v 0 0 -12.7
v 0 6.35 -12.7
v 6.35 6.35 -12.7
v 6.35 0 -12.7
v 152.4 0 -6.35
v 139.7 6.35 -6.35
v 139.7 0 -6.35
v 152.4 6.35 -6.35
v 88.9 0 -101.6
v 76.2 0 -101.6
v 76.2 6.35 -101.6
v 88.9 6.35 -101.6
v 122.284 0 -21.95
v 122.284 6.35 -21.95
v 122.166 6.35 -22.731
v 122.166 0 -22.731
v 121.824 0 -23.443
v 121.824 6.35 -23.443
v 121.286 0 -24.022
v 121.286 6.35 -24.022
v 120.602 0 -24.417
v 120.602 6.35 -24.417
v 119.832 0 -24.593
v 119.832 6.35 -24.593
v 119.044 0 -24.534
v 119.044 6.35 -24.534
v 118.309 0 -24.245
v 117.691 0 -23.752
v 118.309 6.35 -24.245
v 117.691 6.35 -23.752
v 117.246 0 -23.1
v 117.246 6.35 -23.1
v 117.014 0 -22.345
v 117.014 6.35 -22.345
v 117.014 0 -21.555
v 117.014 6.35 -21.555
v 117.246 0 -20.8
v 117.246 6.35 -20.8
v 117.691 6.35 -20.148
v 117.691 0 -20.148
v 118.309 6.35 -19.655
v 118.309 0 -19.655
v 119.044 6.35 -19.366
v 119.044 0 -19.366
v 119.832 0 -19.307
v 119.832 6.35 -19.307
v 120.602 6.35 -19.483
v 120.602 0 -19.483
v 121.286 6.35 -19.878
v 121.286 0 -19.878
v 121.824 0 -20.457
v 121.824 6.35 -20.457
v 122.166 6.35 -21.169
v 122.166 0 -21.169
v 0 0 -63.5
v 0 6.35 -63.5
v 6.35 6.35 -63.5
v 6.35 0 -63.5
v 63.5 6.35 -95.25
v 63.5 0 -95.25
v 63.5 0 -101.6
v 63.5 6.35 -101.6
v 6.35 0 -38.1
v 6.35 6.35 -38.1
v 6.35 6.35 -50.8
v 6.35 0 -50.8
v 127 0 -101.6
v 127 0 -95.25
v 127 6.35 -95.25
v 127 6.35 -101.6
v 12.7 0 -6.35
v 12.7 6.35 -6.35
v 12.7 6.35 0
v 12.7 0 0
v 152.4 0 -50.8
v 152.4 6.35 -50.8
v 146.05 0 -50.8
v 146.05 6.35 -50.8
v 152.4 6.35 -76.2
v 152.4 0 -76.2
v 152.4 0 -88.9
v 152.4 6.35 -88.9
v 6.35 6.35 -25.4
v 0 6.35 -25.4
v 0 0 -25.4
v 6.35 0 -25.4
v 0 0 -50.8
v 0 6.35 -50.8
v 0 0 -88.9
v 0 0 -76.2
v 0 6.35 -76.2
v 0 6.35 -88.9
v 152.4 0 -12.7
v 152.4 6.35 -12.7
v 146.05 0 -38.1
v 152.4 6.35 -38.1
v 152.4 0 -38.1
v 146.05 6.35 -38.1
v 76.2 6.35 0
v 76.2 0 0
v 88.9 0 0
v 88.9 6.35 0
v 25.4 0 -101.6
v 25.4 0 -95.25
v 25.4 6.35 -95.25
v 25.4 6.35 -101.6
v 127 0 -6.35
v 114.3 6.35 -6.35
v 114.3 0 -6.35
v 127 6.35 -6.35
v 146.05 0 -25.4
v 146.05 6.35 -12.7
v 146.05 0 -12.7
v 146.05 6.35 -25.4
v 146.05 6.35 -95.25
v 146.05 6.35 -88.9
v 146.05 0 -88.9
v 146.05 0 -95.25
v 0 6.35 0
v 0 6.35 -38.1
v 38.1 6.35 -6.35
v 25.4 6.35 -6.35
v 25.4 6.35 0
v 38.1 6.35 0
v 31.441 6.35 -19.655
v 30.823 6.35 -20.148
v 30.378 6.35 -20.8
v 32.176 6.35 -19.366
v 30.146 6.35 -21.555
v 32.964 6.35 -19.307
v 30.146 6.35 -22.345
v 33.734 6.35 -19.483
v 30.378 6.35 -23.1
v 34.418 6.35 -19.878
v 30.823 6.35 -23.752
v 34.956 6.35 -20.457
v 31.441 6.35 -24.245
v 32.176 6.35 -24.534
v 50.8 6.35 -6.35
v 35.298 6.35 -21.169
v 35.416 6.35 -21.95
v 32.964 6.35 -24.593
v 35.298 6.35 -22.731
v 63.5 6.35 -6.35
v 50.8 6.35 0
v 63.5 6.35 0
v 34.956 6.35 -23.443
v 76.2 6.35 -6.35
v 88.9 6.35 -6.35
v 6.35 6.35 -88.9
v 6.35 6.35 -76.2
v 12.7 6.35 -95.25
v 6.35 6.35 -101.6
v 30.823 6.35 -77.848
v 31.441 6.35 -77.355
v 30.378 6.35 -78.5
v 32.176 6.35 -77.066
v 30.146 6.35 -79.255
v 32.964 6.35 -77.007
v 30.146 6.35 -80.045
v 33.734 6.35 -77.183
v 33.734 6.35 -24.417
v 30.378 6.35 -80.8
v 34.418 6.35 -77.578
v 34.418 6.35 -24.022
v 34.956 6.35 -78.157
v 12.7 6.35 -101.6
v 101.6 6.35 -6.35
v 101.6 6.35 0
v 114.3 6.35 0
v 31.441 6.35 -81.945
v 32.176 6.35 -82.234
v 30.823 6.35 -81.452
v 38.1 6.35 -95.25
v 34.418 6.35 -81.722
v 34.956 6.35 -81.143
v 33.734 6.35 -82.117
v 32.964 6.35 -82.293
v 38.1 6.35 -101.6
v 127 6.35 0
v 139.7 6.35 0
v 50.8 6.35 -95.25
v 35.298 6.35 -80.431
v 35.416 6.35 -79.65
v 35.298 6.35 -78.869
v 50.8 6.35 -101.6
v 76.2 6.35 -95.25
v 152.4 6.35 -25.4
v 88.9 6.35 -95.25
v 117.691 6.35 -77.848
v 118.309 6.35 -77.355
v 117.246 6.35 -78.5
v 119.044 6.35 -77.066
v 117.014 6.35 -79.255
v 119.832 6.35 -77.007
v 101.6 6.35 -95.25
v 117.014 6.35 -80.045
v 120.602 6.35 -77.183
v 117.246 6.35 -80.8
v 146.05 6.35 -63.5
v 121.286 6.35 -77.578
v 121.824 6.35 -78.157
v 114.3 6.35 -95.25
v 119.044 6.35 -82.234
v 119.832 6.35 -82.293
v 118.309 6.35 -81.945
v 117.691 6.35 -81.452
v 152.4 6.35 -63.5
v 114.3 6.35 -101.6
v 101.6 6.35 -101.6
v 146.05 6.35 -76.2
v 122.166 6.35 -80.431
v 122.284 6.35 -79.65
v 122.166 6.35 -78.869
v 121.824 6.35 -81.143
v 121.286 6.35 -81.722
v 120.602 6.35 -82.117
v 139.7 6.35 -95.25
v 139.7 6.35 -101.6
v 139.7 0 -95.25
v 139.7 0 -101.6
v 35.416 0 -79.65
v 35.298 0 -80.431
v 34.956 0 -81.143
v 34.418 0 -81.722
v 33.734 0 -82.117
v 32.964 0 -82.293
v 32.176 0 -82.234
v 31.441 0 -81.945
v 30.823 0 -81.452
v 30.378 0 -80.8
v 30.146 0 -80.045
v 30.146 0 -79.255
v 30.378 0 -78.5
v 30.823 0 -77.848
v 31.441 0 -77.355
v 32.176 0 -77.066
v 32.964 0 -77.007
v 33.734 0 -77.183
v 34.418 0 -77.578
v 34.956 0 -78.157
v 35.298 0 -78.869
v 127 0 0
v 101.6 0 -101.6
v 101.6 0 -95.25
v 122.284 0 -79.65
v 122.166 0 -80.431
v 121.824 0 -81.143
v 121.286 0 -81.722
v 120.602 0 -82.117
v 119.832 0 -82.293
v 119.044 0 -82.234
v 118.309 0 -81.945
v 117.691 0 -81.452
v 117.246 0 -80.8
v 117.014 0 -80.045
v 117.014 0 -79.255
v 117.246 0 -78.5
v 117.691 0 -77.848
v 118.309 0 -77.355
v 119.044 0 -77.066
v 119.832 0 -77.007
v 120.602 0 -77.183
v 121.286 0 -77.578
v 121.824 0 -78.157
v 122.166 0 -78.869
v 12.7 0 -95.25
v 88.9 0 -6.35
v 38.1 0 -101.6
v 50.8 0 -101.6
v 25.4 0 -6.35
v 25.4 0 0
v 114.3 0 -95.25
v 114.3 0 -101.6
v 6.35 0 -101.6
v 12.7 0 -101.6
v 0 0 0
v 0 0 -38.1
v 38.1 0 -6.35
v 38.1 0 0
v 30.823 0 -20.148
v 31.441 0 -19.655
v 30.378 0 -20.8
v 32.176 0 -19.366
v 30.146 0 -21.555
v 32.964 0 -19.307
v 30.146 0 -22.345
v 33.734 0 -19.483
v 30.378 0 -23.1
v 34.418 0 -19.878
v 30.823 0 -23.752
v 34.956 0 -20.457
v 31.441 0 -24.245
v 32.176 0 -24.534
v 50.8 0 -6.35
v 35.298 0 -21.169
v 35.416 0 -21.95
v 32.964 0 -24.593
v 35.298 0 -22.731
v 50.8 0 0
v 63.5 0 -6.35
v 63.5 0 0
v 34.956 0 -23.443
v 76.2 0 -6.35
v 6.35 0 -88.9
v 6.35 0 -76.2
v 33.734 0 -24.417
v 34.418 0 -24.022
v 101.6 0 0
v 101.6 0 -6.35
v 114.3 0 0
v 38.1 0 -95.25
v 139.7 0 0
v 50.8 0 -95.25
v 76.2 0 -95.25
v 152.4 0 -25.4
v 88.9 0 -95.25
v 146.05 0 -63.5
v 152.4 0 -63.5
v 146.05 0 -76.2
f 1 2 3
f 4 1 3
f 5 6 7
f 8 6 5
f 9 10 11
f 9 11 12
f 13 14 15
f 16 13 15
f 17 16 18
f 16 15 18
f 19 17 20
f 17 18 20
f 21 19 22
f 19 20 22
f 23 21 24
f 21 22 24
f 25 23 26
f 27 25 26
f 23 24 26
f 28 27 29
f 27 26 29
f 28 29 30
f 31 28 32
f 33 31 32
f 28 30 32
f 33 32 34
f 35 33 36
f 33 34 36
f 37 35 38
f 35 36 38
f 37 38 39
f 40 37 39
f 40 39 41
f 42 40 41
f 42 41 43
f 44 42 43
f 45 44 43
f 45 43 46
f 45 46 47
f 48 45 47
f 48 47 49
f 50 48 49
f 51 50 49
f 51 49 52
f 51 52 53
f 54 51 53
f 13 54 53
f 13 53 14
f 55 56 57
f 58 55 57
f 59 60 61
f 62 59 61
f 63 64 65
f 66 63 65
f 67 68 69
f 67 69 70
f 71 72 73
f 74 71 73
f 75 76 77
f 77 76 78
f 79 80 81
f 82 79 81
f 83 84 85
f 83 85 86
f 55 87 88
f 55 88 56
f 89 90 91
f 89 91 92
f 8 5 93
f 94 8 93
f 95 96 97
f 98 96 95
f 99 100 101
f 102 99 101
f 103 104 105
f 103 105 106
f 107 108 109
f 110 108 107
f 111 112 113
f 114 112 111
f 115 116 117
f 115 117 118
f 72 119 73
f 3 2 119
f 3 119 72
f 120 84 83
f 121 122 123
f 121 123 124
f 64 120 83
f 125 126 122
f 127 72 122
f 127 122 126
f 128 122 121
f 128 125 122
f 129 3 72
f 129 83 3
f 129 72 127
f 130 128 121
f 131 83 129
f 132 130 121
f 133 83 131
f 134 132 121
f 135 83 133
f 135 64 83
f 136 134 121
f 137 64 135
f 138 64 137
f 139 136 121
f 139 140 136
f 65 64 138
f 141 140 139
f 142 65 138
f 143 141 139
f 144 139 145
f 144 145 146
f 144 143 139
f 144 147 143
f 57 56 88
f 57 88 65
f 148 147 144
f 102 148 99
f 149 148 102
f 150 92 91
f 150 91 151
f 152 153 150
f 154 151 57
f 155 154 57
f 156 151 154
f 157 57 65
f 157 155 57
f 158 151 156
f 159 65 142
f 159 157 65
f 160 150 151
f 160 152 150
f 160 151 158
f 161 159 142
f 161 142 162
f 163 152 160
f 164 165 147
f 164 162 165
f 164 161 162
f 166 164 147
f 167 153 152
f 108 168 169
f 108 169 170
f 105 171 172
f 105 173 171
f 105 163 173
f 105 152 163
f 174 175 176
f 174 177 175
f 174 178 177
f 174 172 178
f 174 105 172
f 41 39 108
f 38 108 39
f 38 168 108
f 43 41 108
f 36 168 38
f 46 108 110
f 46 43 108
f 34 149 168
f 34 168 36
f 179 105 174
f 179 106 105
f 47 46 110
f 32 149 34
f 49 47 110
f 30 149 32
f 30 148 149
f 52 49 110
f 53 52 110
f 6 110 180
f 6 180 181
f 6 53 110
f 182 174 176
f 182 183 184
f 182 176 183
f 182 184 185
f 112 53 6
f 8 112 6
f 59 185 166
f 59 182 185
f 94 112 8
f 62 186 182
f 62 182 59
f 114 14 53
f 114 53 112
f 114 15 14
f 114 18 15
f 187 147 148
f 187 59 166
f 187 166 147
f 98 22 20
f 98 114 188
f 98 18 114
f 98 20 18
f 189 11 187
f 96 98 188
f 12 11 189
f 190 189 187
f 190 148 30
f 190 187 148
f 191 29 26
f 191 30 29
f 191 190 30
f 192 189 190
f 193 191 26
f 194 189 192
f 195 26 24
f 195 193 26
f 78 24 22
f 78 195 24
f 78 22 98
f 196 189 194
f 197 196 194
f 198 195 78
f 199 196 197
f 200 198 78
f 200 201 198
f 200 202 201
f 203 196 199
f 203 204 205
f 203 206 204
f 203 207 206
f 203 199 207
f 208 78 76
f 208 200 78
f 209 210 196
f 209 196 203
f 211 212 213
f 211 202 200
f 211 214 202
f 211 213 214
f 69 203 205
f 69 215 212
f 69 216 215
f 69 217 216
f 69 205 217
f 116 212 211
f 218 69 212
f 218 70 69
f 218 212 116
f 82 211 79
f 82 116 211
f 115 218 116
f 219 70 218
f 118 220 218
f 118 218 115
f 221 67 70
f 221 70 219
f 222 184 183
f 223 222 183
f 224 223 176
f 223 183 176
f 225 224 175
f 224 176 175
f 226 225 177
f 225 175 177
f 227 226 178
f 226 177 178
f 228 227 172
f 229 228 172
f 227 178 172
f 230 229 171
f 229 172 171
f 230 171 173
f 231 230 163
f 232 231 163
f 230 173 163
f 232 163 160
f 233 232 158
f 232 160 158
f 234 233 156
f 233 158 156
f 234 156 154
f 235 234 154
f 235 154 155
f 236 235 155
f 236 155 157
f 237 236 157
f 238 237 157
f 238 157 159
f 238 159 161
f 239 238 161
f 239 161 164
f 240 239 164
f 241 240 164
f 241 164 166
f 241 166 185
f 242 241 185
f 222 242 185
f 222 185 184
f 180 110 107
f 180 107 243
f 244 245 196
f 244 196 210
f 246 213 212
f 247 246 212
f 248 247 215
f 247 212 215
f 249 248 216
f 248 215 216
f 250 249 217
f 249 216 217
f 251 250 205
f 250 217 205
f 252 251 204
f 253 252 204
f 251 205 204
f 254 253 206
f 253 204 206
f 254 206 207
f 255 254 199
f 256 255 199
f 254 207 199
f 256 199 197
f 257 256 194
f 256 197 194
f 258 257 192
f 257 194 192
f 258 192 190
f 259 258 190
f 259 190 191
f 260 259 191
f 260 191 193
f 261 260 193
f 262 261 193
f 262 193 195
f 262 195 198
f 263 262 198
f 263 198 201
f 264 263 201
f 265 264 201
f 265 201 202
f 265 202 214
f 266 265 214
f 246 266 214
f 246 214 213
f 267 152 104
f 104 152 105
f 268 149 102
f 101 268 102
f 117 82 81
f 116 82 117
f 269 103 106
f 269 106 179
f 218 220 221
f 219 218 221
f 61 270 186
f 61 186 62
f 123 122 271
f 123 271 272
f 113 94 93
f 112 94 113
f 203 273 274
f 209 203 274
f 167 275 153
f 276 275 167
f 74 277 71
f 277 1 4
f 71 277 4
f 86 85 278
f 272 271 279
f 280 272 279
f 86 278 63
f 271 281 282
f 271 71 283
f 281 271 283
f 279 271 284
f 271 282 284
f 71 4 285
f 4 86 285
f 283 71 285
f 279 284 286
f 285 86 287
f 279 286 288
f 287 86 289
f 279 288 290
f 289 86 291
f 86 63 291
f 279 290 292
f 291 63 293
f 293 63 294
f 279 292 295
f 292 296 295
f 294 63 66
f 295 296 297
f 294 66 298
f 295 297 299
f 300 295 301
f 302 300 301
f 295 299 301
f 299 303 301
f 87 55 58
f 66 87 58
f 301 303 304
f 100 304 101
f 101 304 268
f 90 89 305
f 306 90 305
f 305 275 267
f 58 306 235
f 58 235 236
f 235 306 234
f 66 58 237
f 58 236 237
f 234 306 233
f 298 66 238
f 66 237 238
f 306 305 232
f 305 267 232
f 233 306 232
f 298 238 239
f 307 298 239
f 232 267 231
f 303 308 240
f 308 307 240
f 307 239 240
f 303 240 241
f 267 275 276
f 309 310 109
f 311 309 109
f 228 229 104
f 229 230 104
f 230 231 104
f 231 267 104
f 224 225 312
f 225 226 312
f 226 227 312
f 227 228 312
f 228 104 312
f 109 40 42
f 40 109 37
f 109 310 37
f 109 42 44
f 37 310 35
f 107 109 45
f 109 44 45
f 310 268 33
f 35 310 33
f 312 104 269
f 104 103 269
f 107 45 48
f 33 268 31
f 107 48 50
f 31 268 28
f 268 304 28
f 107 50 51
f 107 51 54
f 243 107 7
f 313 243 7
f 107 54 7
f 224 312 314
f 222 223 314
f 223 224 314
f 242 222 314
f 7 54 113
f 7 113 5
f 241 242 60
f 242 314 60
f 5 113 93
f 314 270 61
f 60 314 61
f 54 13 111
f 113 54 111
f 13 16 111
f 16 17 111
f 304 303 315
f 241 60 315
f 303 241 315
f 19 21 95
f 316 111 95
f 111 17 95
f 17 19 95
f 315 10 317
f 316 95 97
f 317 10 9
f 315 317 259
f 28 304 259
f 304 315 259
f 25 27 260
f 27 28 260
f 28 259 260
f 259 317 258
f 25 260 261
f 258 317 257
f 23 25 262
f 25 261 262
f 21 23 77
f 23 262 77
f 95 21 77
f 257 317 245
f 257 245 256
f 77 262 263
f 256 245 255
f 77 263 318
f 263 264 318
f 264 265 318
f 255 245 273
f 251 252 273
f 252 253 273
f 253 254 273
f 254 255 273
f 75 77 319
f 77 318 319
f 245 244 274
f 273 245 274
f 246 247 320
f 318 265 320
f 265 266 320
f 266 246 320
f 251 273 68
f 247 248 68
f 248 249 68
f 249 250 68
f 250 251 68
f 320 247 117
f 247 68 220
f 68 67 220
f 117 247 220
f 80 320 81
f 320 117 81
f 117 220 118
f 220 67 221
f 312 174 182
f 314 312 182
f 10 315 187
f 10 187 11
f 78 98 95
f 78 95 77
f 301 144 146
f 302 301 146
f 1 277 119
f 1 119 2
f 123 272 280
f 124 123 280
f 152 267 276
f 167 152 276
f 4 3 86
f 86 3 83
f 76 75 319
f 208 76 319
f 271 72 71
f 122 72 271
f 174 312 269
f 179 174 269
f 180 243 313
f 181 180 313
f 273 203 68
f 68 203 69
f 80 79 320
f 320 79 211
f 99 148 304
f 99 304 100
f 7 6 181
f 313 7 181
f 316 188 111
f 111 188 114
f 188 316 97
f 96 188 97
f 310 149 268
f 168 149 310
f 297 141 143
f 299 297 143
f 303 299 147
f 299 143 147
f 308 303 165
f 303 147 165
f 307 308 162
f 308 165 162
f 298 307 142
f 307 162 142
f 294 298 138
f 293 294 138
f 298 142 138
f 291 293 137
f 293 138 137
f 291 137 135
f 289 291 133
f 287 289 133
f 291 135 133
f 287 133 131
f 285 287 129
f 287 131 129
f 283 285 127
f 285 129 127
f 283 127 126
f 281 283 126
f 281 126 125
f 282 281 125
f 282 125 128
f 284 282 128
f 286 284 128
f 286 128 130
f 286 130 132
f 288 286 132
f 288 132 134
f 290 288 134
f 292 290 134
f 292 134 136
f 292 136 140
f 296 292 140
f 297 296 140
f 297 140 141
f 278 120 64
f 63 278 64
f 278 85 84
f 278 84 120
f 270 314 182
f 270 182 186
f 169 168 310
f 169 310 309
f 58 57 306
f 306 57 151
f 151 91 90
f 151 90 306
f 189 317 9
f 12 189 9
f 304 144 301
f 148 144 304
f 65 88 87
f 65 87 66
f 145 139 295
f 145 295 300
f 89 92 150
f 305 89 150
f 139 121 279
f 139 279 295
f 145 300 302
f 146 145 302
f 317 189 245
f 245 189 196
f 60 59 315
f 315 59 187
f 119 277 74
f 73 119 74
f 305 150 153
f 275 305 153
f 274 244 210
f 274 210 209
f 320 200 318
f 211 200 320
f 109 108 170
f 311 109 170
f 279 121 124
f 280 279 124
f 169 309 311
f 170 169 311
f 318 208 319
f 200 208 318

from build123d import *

# Parameters (mm, degrees)
SKETCH1_W             = 152.4
SKETCH1_H             = 101.6
BOSS_EXTRUDE2_DEPTH   = 6.35
SKETCH2_W             = 6.35
SKETCH2_H             = 12.7
CUT_EXTRUDE2_DEPTH    = 6.35
SKETCH2_4_W           = 12.7
SKETCH2_4_H           = 6.35
CUT_EXTRUDE3_DEPTH    = 6.35
F_5_0MM_DOWEL_HOLE7_D = 5.3


with BuildPart() as part:
    # Sketch1 → Boss-Extrude2 (new body)
    with BuildSketch(Plane(origin=(0, 0, 0), x_dir=(1, 0, 0), z_dir=(0, 1, 0))):
        with Locations((76.2, 50.8)):
            Rectangle(SKETCH1_W, SKETCH1_H)
    extrude(amount=BOSS_EXTRUDE2_DEPTH)

    # Sketch2 → Cut-Extrude2 (cut)
    with BuildSketch(Plane(origin=(0, 6.35, 0), x_dir=(1, 0, 0), z_dir=(0, 1, 0))):
        with Locations((3.175, 95.25)):
            Rectangle(SKETCH2_W, SKETCH2_H)
        with Locations((3.175, 69.85)):
            Rectangle(SKETCH2_W, SKETCH2_H)
        with Locations((3.175, 44.45)):
            Rectangle(SKETCH2_W, SKETCH2_H)
        with Locations((3.175, 19.05)):
            Rectangle(SKETCH2_W, SKETCH2_H)
    cut_extrude2 = extrude(amount=-CUT_EXTRUDE2_DEPTH, mode=Mode.SUBTRACT)

    # Mirror1: Cut-Extrude2 across plane
    add(cut_extrude2.mirror(Plane.ZY.offset(-76.2)), mode=Mode.SUBTRACT)

    # Sketch2<4> → Cut-Extrude3 (cut)
    with BuildSketch(Plane(origin=(0, 6.35, 0), x_dir=(1, 0, 0), z_dir=(0, 1, 0))):
        with Locations((19.05, 98.425)):
            Rectangle(SKETCH2_4_W, SKETCH2_4_H)
        with Locations((44.45, 98.425)):
            Rectangle(SKETCH2_4_W, SKETCH2_4_H)
        with Locations((69.85, 98.425)):
            Rectangle(SKETCH2_4_W, SKETCH2_4_H)
        with Locations((95.25, 98.425)):
            Rectangle(SKETCH2_4_W, SKETCH2_4_H)
        with Locations((146.05, 98.425)):
            Rectangle(SKETCH2_4_W, SKETCH2_4_H)
        with Locations((120.65, 98.425)):
            Rectangle(SKETCH2_4_W, SKETCH2_4_H)
    cut_extrude3 = extrude(amount=-CUT_EXTRUDE3_DEPTH, mode=Mode.SUBTRACT)

    # Mirror2: Cut-Extrude3 across plane
    add(cut_extrude3.mirror(Plane(origin=(0, 0, -50.8), x_dir=(1, 0, 0), z_dir=(0, 0, -1))), mode=Mode.SUBTRACT)

    # Ø5.0mm Dowel Hole7 (through all)
    with Locations(Plane(origin=(0, 0, 0), x_dir=(-1, 0, 0), z_dir=(0, -1, 0))):
        with Locations((-119.634, 79.65), (-32.766, 79.65), (-32.766, 21.95), (-119.634, 21.95)):
            Hole(F_5_0MM_DOWEL_HOLE7_D / 2)


solid = part.part
